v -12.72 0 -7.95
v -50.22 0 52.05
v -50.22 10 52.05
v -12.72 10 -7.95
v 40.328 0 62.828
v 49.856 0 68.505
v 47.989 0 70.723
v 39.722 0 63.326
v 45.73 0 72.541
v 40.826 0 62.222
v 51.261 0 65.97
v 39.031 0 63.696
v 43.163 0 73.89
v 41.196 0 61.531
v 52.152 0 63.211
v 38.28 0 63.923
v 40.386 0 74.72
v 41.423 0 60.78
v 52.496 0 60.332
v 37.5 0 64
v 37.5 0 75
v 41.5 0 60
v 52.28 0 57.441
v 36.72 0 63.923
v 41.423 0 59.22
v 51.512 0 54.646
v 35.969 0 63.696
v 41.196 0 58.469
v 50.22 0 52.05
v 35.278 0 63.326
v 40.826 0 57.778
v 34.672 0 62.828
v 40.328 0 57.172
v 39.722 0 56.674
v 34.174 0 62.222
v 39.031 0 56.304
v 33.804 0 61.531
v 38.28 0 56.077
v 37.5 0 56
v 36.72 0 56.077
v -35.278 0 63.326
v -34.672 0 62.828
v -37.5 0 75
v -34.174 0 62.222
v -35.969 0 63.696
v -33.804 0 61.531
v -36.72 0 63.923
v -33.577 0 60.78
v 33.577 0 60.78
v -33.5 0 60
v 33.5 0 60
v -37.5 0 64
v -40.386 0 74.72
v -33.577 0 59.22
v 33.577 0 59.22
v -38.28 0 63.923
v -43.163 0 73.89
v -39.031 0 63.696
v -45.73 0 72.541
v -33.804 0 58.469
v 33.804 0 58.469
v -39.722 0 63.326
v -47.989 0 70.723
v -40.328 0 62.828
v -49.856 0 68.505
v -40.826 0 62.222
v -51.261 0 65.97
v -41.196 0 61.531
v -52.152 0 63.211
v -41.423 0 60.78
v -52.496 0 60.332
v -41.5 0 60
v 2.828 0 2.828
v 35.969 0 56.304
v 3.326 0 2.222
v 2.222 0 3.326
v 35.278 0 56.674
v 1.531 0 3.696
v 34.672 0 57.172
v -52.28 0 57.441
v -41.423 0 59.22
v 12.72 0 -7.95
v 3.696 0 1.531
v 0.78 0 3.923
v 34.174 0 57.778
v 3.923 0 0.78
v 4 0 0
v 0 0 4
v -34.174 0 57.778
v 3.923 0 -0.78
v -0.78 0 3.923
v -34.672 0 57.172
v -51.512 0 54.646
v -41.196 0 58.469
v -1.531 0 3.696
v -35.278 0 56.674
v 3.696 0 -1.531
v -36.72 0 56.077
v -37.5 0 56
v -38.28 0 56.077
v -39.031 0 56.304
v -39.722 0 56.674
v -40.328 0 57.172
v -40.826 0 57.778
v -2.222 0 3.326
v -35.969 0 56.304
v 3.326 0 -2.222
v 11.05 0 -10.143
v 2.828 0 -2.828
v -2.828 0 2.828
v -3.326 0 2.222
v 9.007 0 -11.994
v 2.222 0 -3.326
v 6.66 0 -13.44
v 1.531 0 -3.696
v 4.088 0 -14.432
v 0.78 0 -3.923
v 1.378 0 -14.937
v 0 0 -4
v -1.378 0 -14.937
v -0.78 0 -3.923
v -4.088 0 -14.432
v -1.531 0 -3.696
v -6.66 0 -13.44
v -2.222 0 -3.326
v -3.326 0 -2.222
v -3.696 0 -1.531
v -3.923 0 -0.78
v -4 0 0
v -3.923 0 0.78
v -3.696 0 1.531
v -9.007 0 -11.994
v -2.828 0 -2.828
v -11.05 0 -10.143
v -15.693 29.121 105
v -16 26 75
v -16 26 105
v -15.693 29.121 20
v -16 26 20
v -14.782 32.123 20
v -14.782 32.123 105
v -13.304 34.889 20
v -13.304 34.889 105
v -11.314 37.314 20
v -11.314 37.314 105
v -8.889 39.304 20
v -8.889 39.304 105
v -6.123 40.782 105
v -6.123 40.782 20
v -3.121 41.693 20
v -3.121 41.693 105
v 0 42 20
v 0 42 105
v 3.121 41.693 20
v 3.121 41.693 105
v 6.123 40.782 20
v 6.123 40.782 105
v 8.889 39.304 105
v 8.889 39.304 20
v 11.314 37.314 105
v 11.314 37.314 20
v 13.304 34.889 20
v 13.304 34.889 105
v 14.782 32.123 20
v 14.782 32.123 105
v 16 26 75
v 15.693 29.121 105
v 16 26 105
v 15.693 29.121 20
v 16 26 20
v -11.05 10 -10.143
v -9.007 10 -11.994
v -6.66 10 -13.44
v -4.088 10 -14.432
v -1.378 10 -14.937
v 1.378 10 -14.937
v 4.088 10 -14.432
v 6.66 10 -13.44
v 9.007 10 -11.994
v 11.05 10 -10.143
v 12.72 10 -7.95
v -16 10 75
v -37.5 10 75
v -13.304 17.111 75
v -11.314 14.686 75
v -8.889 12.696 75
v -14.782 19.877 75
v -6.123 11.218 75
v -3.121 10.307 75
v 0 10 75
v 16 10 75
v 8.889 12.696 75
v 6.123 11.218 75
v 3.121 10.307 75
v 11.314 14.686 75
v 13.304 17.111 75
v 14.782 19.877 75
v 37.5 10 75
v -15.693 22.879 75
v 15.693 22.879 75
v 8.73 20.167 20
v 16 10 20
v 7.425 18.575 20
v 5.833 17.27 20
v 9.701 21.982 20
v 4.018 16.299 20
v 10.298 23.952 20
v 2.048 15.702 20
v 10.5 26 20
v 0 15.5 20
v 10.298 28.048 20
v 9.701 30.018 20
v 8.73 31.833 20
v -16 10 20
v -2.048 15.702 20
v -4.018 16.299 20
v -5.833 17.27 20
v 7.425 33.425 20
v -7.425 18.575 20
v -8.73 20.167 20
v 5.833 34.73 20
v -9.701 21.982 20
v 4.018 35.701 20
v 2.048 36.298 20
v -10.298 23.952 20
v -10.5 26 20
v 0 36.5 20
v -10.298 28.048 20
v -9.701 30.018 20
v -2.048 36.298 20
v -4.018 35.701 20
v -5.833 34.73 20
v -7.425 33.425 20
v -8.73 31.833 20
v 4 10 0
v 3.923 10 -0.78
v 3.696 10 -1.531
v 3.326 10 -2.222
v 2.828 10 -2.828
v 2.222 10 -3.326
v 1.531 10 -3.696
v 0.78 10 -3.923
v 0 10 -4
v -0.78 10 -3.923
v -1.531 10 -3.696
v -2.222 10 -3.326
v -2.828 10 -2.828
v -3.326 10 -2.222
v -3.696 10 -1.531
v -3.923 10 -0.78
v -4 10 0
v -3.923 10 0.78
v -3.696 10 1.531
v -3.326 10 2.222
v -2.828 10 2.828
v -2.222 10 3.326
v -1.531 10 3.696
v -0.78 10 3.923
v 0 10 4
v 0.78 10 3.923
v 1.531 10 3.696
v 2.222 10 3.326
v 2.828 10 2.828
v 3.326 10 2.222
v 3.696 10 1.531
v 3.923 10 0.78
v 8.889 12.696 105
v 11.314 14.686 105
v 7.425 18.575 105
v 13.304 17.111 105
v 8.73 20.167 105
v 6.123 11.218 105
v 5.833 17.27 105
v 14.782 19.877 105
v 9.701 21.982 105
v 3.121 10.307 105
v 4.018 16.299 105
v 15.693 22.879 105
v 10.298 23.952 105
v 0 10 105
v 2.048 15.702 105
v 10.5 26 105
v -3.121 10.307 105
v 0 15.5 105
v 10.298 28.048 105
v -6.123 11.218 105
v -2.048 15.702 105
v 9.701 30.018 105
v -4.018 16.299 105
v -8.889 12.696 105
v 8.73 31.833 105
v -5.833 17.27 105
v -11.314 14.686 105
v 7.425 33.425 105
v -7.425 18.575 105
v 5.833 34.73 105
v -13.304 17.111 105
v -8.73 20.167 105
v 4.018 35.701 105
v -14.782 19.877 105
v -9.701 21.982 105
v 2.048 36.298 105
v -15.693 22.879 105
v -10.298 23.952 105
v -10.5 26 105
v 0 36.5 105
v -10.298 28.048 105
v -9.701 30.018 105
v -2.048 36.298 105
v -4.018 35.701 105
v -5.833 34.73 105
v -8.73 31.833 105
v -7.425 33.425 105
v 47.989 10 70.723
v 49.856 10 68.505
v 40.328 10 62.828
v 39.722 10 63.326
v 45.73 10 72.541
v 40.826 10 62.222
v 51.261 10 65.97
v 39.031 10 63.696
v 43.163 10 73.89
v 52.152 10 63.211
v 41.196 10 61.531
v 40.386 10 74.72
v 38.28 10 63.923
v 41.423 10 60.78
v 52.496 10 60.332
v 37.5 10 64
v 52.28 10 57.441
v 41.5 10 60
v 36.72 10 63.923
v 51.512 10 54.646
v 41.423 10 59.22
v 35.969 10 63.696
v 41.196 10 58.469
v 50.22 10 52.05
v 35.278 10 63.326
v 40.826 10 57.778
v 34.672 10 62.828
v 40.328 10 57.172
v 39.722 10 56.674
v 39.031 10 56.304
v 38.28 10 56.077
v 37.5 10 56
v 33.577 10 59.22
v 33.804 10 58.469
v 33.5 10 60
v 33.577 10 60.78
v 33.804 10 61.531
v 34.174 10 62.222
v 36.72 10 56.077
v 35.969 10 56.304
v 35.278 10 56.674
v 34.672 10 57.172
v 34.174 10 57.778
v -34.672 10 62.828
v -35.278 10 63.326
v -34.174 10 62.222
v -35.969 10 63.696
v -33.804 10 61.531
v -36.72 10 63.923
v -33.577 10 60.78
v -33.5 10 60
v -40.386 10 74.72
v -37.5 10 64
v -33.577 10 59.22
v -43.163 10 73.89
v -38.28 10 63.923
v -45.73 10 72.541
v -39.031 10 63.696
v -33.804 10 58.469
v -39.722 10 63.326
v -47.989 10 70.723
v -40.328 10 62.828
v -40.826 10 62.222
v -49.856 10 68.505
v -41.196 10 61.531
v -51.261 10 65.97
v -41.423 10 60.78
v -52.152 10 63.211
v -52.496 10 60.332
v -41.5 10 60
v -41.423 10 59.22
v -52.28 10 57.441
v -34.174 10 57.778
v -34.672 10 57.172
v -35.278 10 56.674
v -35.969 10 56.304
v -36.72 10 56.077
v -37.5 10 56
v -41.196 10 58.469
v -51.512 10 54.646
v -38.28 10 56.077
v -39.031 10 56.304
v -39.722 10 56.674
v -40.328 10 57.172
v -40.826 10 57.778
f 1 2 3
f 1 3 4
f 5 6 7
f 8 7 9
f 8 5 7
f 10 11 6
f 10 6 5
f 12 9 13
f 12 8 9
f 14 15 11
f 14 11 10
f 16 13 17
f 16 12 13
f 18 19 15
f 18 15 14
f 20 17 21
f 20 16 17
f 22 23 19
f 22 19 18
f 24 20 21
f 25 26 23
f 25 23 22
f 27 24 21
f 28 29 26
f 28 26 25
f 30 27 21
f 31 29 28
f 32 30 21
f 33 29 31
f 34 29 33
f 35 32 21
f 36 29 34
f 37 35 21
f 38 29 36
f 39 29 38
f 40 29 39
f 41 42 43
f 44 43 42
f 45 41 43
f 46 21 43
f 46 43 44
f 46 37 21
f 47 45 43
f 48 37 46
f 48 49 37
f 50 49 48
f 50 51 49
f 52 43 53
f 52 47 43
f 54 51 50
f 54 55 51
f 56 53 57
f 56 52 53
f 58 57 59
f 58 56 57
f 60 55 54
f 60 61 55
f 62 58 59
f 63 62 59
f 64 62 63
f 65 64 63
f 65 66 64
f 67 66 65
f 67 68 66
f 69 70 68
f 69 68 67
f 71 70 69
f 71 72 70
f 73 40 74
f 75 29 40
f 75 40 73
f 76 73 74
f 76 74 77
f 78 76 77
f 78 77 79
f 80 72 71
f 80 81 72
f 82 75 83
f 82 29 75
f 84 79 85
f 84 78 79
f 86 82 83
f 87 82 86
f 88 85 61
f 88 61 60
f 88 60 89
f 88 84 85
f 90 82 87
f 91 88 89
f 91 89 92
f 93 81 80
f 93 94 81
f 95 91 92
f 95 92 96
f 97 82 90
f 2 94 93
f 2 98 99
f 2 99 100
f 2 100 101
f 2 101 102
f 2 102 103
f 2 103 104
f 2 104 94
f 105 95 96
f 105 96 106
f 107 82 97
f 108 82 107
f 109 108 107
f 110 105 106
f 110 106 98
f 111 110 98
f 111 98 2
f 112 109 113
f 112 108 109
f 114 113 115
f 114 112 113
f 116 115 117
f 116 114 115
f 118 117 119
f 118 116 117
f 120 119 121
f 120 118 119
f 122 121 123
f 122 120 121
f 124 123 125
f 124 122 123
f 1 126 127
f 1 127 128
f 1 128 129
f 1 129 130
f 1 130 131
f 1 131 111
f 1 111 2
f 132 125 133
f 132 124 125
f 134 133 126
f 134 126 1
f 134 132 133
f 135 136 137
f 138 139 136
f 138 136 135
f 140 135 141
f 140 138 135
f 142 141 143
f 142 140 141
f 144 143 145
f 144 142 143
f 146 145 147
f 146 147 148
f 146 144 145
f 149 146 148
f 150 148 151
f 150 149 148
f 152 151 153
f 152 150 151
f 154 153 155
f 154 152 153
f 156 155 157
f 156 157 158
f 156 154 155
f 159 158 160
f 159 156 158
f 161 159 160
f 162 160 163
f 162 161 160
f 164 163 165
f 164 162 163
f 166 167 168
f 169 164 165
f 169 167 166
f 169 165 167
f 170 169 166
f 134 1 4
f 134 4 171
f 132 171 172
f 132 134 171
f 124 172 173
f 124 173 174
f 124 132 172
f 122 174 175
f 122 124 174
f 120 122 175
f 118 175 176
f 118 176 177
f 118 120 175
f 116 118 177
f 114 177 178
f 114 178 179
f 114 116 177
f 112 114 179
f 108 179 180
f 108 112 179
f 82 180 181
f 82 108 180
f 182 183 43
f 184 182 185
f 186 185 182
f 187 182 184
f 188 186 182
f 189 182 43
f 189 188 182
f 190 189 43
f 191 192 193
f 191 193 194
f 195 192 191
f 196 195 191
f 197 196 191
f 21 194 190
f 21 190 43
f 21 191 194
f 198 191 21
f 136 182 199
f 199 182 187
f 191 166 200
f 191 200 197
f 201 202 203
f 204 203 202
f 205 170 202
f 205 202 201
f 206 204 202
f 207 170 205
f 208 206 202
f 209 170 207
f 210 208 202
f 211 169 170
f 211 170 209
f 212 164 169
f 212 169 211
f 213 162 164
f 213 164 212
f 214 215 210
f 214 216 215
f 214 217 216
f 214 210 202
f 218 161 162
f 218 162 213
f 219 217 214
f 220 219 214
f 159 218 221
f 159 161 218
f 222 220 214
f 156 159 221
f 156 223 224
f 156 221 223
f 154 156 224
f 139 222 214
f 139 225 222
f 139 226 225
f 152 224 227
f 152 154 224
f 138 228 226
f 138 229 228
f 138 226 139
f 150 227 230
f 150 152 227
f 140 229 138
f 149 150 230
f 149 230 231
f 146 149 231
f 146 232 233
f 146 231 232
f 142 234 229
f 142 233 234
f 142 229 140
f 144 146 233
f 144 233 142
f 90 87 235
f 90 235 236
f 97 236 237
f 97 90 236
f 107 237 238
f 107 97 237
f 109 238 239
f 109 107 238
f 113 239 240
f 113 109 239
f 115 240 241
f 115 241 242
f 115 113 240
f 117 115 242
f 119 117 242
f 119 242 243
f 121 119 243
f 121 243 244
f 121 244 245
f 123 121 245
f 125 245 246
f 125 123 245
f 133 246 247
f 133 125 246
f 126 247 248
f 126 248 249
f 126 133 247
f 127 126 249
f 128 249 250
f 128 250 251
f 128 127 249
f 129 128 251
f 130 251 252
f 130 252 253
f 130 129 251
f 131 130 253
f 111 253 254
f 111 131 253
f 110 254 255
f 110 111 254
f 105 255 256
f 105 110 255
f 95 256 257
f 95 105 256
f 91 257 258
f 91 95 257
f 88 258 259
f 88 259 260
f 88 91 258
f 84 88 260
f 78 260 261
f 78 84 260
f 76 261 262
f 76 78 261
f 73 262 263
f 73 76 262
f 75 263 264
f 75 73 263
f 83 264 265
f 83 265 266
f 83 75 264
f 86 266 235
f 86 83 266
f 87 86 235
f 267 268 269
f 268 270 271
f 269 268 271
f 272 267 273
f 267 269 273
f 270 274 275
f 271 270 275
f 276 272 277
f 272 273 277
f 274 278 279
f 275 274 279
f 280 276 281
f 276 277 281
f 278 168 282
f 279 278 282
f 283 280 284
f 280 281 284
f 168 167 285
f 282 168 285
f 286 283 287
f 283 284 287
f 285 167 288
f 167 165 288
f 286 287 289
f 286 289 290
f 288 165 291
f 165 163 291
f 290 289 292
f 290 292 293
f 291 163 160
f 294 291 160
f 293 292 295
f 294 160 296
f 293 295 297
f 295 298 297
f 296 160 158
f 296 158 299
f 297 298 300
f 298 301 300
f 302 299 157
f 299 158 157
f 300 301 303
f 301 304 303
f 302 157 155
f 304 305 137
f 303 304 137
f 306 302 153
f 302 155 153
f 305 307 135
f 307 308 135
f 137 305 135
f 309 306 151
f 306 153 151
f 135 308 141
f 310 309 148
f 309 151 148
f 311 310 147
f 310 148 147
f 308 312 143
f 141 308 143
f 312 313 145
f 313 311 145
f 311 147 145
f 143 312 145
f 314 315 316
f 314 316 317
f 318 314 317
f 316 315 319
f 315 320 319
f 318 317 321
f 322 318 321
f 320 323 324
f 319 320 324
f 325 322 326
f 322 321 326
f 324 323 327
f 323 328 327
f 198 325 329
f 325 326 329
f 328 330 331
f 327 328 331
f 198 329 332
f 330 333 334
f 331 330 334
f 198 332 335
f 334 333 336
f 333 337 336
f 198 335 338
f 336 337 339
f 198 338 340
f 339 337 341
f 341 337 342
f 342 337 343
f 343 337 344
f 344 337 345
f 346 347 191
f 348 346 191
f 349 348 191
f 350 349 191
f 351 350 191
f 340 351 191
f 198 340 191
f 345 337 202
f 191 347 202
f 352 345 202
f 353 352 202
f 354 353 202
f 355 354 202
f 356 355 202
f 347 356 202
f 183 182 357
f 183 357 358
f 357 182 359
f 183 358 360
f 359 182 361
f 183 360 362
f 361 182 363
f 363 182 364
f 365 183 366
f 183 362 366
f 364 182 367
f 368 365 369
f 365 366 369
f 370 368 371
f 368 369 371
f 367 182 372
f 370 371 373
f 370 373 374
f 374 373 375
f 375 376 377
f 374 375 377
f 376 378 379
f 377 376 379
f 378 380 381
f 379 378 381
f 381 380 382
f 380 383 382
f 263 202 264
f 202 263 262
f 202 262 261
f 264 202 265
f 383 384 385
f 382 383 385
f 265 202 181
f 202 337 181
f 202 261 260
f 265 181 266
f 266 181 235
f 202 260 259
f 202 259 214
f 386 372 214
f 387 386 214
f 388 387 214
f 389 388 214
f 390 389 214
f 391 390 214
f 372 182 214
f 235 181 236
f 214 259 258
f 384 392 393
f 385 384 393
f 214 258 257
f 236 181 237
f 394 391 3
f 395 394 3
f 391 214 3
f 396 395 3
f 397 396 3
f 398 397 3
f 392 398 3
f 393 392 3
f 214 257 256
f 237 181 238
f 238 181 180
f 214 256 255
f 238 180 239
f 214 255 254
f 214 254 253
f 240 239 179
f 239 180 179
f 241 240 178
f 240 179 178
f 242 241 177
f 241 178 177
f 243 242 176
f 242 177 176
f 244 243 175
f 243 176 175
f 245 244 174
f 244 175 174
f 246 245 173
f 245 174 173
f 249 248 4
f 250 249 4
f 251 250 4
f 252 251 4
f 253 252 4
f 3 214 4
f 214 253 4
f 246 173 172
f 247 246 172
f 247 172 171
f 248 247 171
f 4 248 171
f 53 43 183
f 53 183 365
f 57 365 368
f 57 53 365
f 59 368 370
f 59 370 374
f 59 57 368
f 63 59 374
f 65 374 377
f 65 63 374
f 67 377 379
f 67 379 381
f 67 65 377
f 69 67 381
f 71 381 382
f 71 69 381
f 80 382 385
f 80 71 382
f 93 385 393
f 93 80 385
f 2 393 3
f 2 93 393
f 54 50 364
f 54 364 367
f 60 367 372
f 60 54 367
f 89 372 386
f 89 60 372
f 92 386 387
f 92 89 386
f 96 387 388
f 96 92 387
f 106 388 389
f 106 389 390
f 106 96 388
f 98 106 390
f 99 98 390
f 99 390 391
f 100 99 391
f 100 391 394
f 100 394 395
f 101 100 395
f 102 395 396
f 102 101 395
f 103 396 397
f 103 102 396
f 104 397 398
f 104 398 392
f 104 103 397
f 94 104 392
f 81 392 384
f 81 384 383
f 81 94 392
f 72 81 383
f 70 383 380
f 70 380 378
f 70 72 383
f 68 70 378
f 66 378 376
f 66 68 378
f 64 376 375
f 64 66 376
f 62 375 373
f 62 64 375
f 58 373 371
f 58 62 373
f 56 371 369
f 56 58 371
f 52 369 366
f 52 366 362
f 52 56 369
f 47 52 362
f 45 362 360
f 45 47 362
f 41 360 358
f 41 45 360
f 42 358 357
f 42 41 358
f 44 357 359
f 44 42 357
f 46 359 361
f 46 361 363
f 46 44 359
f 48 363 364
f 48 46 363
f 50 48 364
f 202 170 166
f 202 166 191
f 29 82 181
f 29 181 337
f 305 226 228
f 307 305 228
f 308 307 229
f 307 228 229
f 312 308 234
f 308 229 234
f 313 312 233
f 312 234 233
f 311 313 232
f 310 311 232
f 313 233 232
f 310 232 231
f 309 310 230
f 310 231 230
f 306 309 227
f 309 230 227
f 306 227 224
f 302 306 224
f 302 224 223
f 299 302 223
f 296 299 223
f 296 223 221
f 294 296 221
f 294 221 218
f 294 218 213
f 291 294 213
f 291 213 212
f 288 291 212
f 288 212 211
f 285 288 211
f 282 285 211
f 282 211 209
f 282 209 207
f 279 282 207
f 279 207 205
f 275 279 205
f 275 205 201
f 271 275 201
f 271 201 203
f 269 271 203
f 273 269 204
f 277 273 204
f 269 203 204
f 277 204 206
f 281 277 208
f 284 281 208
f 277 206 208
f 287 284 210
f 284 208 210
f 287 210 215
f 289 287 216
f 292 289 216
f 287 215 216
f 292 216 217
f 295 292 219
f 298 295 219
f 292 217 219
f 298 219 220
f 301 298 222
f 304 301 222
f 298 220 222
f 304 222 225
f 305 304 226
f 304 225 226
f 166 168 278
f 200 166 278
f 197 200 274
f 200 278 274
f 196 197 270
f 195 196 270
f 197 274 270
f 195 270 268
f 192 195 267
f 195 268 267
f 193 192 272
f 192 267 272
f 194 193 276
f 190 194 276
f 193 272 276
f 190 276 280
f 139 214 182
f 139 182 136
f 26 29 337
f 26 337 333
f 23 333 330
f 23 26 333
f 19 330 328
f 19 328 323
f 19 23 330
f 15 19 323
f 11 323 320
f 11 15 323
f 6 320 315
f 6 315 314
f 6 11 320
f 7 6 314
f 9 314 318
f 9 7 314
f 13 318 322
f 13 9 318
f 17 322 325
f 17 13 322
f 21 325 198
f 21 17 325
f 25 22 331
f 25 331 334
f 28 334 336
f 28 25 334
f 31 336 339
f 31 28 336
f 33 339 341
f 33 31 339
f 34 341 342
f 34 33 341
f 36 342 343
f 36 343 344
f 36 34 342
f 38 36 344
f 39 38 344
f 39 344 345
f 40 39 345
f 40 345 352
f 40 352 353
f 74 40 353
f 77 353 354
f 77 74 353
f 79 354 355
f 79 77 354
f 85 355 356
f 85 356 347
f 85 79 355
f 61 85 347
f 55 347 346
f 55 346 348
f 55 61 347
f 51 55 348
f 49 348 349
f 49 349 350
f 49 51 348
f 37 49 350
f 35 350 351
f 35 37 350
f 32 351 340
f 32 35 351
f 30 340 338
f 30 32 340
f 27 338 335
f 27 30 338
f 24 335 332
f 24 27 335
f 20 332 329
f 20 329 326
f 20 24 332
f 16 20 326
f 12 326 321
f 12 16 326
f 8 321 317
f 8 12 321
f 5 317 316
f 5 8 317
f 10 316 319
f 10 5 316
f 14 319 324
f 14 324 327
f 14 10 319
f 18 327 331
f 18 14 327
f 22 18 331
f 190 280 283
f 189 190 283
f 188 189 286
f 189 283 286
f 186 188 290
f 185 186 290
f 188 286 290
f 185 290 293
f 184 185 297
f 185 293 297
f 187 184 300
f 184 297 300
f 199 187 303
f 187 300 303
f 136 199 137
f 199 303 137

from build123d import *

# Parameters (mm, degrees)
SKETCH2_R               = 4
BOSS_EXTRUDE1_DEPTH     = 10
BOSS_EXTRUDE2_DEPTH     = 85
SKETCH5_R               = 10.5
CUT_EXTRUDE1_DEPTH      = 36
CUT_EXTRUDE1_DEPTH_BACK = 86
CUT_EXTRUDE2_DEPTH      = 30


with BuildPart() as part:
    # Sketch2 → Boss-Extrude1 (new body)
    with BuildSketch(Plane(origin=(0, 0, 0), x_dir=(1, 0, 0), z_dir=(0, 1, 0))):
        with BuildLine():
            Line((-50.21997456, -52.0500159), (-12.71997456, 7.9499841))
            ThreePointArc((-12.71997456, 7.9499841), (0, 15), (12.71997456, 7.9499841))
            Line((12.71997456, 7.9499841), (50.21997456, -52.0500159))
            ThreePointArc((50.21997456, -52.0500159), (50.619637219, -67.271527986), (37.5, -75))
            Line((37.5, -75), (-37.5, -75))
            ThreePointArc((-37.5, -75), (-50.619637219, -67.271527986), (-50.21997456, -52.0500159))
        make_face()
        Circle(SKETCH2_R, mode=Mode.SUBTRACT)
        with Locations((-37.5, -60)):
            Circle(SKETCH2_R, mode=Mode.SUBTRACT)
        with Locations((37.5, -60)):
            Circle(SKETCH2_R, mode=Mode.SUBTRACT)
    extrude(amount=BOSS_EXTRUDE1_DEPTH)

    # Sketch4 → Boss-Extrude2 (add)
    with BuildSketch(Plane.XY.offset(20)):
        with BuildLine():
            Line((16, 26), (16, 10))
            Line((16, 10), (-16, 10))
            Line((-16, 10), (-16, 26))
            ThreePointArc((-16, 26), (0, 42), (16, 26))
        make_face()
    extrude(amount=BOSS_EXTRUDE2_DEPTH)

    # Sketch5 → Cut-Extrude1 (cut, two sides)
    with BuildSketch(Plane(origin=(0, 0, 20), x_dir=(-1, 0, 0), z_dir=(0, 0, -1))) as cut_extrude1_sk:
        with Locations((0, 26)):
            Circle(SKETCH5_R)
    extrude(amount=CUT_EXTRUDE1_DEPTH, mode=Mode.SUBTRACT)
    extrude(cut_extrude1_sk.sketch, amount=-CUT_EXTRUDE1_DEPTH_BACK, mode=Mode.SUBTRACT)

    # Sketch6 → Cut-Extrude2 (cut)
    with BuildSketch(Plane.XY.offset(105)):
        with BuildLine():
            ThreePointArc((16, 26), (11.313708518, 14.68629152), (5.5e-08, 10))
            Line((5.5e-08, 10), (16, 10))
            Line((16, 10), (16, 26))
        make_face()
        with BuildLine():
            ThreePointArc((5.5e-08, 10), (-11.31370848, 14.686291482), (-16, 26))
            Line((-16, 26), (-16, 10))
            Line((-16, 10), (5.5e-08, 10))
        make_face()
    extrude(amount=-CUT_EXTRUDE2_DEPTH, mode=Mode.SUBTRACT)


solid = part.part
